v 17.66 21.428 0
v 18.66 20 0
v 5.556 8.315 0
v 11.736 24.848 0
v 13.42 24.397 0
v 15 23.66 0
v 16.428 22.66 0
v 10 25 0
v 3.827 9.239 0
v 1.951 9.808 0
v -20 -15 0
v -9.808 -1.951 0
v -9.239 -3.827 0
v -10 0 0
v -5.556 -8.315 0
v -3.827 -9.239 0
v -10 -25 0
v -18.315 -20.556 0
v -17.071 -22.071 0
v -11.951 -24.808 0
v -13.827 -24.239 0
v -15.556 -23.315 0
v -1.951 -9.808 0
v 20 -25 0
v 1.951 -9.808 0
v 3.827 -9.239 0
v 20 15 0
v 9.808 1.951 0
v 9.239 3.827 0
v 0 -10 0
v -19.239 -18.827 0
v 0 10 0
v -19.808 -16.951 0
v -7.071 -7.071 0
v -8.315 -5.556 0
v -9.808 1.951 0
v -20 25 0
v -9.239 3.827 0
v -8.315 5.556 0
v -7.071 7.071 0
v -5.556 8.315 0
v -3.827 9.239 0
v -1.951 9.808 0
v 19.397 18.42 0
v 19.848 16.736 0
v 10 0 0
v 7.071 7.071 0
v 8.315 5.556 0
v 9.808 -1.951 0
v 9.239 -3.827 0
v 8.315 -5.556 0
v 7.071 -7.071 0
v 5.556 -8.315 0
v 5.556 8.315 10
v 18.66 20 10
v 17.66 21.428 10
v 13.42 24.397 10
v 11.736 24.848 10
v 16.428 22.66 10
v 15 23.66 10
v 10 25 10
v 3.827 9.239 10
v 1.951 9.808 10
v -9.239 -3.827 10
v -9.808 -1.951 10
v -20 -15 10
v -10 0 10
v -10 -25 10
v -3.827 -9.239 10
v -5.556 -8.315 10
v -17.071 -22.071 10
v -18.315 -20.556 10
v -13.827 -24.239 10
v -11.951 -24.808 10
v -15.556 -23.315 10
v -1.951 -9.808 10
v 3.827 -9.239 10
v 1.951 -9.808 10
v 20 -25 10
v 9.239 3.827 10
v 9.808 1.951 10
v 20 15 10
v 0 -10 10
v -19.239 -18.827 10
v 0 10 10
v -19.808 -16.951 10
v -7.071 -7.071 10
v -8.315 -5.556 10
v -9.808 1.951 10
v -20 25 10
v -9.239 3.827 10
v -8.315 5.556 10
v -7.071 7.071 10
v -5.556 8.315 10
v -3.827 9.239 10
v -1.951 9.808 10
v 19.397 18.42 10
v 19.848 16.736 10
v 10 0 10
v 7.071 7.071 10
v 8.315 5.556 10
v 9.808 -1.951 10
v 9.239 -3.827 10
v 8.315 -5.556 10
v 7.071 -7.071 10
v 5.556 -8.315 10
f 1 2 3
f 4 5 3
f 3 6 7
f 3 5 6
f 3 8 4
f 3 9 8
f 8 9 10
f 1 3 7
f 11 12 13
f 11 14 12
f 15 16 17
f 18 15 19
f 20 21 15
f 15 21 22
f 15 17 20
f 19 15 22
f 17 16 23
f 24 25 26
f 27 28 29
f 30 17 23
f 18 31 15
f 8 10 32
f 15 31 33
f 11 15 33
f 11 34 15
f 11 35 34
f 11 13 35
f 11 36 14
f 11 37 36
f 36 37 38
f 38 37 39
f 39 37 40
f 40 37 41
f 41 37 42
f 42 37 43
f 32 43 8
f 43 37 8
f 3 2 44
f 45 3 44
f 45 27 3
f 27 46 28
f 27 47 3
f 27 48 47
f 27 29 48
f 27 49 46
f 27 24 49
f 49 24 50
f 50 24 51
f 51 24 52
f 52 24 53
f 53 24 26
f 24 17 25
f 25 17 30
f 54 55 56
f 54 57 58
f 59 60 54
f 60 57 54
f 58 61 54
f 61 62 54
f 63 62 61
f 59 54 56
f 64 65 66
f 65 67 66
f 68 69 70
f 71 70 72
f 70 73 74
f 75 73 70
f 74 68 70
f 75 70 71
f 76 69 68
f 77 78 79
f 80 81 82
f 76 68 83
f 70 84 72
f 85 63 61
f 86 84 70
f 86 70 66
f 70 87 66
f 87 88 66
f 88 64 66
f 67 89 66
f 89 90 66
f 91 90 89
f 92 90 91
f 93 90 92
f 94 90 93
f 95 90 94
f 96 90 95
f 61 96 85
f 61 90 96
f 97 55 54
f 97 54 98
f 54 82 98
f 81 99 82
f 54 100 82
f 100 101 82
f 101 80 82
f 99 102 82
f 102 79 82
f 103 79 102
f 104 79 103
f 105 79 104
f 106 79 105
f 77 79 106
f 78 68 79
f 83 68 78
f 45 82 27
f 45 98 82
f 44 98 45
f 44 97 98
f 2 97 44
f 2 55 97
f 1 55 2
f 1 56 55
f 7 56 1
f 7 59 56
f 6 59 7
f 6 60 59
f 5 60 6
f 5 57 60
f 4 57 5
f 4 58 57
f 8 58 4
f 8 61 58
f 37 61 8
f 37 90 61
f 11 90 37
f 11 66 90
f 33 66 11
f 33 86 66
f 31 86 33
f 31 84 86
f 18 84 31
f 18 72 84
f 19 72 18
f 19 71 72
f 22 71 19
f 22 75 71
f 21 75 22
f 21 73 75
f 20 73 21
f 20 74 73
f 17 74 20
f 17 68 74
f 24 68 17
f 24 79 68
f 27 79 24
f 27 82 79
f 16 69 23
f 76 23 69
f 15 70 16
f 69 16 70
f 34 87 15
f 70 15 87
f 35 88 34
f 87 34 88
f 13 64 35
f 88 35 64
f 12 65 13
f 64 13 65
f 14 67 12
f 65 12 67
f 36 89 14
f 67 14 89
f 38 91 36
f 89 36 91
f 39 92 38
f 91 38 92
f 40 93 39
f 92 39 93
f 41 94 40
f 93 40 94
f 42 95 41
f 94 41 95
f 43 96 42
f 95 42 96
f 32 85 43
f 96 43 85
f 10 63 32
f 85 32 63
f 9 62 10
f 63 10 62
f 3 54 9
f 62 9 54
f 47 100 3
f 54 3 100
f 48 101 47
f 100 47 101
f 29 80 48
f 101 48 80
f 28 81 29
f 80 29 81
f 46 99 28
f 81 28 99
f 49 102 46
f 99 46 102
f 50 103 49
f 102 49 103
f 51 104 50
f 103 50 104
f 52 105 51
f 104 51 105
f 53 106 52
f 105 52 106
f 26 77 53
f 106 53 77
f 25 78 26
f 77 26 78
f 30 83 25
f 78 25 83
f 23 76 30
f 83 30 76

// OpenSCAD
// Generated by Parametrix
ca_voila_faceVoila_000 = [ [ -10.0000, -25.0000 ],[ 20.0000, -25.0000 ],[ 20.0000, 15.0000 ],[ 19.8481, 16.7365 ],[ 19.3969, 18.4202 ],[ 18.6603, 20.0000 ],[ 17.6604, 21.4279 ],[ 16.4279, 22.6604 ],[ 15.0000, 23.6603 ],[ 13.4202, 24.3969 ],[ 11.7365, 24.8481 ],[ 10.0000, 25.0000 ],[ -20.0000, 25.0000 ],[ -20.0000, -15.0000 ],[ -19.8079, -16.9509 ],[ -19.2388, -18.8268 ],[ -18.3147, -20.5557 ],[ -17.0711, -22.0711 ],[ -15.5557, -23.3147 ],[ -13.8268, -24.2388 ],[ -11.9509, -24.8079 ],[ -10.0000, -25.0000 ] ];
cb_voila_faceVoila_000 = [  0, 1, 2, 3, 4, 5, 6, 7, 8, 9, 10, 11, 12, 13, 14, 15, 16, 17, 18, 19, 20, 21 ];
ca_voila_faceVoila_001 = [ [ 10.0000, 0.0000 ],[ 9.8079, 1.9509 ],[ 9.2388, 3.8268 ],[ 8.3147, 5.5557 ],[ 7.0711, 7.0711 ],[ 5.5557, 8.3147 ],[ 3.8268, 9.2388 ],[ 1.9509, 9.8079 ],[ 0.0000, 10.0000 ],[ -1.9509, 9.8079 ],[ -3.8268, 9.2388 ],[ -5.5557, 8.3147 ],[ -7.0711, 7.0711 ],[ -8.3147, 5.5557 ],[ -9.2388, 3.8268 ],[ -9.8079, 1.9509 ],[ -10.0000, 0.0000 ],[ -9.8079, -1.9509 ],[ -9.2388, -3.8268 ],[ -8.3147, -5.5557 ],[ -7.0711, -7.0711 ],[ -5.5557, -8.3147 ],[ -3.8268, -9.2388 ],[ -1.9509, -9.8079 ],[ -0.0000, -10.0000 ],[ 1.9509, -9.8079 ],[ 3.8268, -9.2388 ],[ 5.5557, -8.3147 ],[ 7.0711, -7.0711 ],[ 8.3147, -5.5557 ],[ 9.2388, -3.8268 ],[ 9.8079, -1.9509 ],[ 10.0000, 0.0000 ] ];
cb_voila_faceVoila_001 = [  22, 23, 24, 25, 26, 27, 28, 29, 30, 31, 32, 33, 34, 35, 36, 37, 38, 39, 40, 41, 42, 43, 44, 45, 46, 47, 48, 49, 50, 51, 52, 53, 54 ];
a_voila_faceVoila = concat(ca_voila_faceVoila_000, ca_voila_faceVoila_001);
b_voila_faceVoila = [cb_voila_faceVoila_000, cb_voila_faceVoila_001];

module subpax_voila_top () {
	translate( [ 0, 0, 0 ])
		rotate( [ 0, 0, 0 ])
			   linear_extrude(height = 10) polygon(a_voila_faceVoila, b_voila_faceVoila);
}

module pax_voila () {
	subpax_voila_top();
}

pax_voila();
